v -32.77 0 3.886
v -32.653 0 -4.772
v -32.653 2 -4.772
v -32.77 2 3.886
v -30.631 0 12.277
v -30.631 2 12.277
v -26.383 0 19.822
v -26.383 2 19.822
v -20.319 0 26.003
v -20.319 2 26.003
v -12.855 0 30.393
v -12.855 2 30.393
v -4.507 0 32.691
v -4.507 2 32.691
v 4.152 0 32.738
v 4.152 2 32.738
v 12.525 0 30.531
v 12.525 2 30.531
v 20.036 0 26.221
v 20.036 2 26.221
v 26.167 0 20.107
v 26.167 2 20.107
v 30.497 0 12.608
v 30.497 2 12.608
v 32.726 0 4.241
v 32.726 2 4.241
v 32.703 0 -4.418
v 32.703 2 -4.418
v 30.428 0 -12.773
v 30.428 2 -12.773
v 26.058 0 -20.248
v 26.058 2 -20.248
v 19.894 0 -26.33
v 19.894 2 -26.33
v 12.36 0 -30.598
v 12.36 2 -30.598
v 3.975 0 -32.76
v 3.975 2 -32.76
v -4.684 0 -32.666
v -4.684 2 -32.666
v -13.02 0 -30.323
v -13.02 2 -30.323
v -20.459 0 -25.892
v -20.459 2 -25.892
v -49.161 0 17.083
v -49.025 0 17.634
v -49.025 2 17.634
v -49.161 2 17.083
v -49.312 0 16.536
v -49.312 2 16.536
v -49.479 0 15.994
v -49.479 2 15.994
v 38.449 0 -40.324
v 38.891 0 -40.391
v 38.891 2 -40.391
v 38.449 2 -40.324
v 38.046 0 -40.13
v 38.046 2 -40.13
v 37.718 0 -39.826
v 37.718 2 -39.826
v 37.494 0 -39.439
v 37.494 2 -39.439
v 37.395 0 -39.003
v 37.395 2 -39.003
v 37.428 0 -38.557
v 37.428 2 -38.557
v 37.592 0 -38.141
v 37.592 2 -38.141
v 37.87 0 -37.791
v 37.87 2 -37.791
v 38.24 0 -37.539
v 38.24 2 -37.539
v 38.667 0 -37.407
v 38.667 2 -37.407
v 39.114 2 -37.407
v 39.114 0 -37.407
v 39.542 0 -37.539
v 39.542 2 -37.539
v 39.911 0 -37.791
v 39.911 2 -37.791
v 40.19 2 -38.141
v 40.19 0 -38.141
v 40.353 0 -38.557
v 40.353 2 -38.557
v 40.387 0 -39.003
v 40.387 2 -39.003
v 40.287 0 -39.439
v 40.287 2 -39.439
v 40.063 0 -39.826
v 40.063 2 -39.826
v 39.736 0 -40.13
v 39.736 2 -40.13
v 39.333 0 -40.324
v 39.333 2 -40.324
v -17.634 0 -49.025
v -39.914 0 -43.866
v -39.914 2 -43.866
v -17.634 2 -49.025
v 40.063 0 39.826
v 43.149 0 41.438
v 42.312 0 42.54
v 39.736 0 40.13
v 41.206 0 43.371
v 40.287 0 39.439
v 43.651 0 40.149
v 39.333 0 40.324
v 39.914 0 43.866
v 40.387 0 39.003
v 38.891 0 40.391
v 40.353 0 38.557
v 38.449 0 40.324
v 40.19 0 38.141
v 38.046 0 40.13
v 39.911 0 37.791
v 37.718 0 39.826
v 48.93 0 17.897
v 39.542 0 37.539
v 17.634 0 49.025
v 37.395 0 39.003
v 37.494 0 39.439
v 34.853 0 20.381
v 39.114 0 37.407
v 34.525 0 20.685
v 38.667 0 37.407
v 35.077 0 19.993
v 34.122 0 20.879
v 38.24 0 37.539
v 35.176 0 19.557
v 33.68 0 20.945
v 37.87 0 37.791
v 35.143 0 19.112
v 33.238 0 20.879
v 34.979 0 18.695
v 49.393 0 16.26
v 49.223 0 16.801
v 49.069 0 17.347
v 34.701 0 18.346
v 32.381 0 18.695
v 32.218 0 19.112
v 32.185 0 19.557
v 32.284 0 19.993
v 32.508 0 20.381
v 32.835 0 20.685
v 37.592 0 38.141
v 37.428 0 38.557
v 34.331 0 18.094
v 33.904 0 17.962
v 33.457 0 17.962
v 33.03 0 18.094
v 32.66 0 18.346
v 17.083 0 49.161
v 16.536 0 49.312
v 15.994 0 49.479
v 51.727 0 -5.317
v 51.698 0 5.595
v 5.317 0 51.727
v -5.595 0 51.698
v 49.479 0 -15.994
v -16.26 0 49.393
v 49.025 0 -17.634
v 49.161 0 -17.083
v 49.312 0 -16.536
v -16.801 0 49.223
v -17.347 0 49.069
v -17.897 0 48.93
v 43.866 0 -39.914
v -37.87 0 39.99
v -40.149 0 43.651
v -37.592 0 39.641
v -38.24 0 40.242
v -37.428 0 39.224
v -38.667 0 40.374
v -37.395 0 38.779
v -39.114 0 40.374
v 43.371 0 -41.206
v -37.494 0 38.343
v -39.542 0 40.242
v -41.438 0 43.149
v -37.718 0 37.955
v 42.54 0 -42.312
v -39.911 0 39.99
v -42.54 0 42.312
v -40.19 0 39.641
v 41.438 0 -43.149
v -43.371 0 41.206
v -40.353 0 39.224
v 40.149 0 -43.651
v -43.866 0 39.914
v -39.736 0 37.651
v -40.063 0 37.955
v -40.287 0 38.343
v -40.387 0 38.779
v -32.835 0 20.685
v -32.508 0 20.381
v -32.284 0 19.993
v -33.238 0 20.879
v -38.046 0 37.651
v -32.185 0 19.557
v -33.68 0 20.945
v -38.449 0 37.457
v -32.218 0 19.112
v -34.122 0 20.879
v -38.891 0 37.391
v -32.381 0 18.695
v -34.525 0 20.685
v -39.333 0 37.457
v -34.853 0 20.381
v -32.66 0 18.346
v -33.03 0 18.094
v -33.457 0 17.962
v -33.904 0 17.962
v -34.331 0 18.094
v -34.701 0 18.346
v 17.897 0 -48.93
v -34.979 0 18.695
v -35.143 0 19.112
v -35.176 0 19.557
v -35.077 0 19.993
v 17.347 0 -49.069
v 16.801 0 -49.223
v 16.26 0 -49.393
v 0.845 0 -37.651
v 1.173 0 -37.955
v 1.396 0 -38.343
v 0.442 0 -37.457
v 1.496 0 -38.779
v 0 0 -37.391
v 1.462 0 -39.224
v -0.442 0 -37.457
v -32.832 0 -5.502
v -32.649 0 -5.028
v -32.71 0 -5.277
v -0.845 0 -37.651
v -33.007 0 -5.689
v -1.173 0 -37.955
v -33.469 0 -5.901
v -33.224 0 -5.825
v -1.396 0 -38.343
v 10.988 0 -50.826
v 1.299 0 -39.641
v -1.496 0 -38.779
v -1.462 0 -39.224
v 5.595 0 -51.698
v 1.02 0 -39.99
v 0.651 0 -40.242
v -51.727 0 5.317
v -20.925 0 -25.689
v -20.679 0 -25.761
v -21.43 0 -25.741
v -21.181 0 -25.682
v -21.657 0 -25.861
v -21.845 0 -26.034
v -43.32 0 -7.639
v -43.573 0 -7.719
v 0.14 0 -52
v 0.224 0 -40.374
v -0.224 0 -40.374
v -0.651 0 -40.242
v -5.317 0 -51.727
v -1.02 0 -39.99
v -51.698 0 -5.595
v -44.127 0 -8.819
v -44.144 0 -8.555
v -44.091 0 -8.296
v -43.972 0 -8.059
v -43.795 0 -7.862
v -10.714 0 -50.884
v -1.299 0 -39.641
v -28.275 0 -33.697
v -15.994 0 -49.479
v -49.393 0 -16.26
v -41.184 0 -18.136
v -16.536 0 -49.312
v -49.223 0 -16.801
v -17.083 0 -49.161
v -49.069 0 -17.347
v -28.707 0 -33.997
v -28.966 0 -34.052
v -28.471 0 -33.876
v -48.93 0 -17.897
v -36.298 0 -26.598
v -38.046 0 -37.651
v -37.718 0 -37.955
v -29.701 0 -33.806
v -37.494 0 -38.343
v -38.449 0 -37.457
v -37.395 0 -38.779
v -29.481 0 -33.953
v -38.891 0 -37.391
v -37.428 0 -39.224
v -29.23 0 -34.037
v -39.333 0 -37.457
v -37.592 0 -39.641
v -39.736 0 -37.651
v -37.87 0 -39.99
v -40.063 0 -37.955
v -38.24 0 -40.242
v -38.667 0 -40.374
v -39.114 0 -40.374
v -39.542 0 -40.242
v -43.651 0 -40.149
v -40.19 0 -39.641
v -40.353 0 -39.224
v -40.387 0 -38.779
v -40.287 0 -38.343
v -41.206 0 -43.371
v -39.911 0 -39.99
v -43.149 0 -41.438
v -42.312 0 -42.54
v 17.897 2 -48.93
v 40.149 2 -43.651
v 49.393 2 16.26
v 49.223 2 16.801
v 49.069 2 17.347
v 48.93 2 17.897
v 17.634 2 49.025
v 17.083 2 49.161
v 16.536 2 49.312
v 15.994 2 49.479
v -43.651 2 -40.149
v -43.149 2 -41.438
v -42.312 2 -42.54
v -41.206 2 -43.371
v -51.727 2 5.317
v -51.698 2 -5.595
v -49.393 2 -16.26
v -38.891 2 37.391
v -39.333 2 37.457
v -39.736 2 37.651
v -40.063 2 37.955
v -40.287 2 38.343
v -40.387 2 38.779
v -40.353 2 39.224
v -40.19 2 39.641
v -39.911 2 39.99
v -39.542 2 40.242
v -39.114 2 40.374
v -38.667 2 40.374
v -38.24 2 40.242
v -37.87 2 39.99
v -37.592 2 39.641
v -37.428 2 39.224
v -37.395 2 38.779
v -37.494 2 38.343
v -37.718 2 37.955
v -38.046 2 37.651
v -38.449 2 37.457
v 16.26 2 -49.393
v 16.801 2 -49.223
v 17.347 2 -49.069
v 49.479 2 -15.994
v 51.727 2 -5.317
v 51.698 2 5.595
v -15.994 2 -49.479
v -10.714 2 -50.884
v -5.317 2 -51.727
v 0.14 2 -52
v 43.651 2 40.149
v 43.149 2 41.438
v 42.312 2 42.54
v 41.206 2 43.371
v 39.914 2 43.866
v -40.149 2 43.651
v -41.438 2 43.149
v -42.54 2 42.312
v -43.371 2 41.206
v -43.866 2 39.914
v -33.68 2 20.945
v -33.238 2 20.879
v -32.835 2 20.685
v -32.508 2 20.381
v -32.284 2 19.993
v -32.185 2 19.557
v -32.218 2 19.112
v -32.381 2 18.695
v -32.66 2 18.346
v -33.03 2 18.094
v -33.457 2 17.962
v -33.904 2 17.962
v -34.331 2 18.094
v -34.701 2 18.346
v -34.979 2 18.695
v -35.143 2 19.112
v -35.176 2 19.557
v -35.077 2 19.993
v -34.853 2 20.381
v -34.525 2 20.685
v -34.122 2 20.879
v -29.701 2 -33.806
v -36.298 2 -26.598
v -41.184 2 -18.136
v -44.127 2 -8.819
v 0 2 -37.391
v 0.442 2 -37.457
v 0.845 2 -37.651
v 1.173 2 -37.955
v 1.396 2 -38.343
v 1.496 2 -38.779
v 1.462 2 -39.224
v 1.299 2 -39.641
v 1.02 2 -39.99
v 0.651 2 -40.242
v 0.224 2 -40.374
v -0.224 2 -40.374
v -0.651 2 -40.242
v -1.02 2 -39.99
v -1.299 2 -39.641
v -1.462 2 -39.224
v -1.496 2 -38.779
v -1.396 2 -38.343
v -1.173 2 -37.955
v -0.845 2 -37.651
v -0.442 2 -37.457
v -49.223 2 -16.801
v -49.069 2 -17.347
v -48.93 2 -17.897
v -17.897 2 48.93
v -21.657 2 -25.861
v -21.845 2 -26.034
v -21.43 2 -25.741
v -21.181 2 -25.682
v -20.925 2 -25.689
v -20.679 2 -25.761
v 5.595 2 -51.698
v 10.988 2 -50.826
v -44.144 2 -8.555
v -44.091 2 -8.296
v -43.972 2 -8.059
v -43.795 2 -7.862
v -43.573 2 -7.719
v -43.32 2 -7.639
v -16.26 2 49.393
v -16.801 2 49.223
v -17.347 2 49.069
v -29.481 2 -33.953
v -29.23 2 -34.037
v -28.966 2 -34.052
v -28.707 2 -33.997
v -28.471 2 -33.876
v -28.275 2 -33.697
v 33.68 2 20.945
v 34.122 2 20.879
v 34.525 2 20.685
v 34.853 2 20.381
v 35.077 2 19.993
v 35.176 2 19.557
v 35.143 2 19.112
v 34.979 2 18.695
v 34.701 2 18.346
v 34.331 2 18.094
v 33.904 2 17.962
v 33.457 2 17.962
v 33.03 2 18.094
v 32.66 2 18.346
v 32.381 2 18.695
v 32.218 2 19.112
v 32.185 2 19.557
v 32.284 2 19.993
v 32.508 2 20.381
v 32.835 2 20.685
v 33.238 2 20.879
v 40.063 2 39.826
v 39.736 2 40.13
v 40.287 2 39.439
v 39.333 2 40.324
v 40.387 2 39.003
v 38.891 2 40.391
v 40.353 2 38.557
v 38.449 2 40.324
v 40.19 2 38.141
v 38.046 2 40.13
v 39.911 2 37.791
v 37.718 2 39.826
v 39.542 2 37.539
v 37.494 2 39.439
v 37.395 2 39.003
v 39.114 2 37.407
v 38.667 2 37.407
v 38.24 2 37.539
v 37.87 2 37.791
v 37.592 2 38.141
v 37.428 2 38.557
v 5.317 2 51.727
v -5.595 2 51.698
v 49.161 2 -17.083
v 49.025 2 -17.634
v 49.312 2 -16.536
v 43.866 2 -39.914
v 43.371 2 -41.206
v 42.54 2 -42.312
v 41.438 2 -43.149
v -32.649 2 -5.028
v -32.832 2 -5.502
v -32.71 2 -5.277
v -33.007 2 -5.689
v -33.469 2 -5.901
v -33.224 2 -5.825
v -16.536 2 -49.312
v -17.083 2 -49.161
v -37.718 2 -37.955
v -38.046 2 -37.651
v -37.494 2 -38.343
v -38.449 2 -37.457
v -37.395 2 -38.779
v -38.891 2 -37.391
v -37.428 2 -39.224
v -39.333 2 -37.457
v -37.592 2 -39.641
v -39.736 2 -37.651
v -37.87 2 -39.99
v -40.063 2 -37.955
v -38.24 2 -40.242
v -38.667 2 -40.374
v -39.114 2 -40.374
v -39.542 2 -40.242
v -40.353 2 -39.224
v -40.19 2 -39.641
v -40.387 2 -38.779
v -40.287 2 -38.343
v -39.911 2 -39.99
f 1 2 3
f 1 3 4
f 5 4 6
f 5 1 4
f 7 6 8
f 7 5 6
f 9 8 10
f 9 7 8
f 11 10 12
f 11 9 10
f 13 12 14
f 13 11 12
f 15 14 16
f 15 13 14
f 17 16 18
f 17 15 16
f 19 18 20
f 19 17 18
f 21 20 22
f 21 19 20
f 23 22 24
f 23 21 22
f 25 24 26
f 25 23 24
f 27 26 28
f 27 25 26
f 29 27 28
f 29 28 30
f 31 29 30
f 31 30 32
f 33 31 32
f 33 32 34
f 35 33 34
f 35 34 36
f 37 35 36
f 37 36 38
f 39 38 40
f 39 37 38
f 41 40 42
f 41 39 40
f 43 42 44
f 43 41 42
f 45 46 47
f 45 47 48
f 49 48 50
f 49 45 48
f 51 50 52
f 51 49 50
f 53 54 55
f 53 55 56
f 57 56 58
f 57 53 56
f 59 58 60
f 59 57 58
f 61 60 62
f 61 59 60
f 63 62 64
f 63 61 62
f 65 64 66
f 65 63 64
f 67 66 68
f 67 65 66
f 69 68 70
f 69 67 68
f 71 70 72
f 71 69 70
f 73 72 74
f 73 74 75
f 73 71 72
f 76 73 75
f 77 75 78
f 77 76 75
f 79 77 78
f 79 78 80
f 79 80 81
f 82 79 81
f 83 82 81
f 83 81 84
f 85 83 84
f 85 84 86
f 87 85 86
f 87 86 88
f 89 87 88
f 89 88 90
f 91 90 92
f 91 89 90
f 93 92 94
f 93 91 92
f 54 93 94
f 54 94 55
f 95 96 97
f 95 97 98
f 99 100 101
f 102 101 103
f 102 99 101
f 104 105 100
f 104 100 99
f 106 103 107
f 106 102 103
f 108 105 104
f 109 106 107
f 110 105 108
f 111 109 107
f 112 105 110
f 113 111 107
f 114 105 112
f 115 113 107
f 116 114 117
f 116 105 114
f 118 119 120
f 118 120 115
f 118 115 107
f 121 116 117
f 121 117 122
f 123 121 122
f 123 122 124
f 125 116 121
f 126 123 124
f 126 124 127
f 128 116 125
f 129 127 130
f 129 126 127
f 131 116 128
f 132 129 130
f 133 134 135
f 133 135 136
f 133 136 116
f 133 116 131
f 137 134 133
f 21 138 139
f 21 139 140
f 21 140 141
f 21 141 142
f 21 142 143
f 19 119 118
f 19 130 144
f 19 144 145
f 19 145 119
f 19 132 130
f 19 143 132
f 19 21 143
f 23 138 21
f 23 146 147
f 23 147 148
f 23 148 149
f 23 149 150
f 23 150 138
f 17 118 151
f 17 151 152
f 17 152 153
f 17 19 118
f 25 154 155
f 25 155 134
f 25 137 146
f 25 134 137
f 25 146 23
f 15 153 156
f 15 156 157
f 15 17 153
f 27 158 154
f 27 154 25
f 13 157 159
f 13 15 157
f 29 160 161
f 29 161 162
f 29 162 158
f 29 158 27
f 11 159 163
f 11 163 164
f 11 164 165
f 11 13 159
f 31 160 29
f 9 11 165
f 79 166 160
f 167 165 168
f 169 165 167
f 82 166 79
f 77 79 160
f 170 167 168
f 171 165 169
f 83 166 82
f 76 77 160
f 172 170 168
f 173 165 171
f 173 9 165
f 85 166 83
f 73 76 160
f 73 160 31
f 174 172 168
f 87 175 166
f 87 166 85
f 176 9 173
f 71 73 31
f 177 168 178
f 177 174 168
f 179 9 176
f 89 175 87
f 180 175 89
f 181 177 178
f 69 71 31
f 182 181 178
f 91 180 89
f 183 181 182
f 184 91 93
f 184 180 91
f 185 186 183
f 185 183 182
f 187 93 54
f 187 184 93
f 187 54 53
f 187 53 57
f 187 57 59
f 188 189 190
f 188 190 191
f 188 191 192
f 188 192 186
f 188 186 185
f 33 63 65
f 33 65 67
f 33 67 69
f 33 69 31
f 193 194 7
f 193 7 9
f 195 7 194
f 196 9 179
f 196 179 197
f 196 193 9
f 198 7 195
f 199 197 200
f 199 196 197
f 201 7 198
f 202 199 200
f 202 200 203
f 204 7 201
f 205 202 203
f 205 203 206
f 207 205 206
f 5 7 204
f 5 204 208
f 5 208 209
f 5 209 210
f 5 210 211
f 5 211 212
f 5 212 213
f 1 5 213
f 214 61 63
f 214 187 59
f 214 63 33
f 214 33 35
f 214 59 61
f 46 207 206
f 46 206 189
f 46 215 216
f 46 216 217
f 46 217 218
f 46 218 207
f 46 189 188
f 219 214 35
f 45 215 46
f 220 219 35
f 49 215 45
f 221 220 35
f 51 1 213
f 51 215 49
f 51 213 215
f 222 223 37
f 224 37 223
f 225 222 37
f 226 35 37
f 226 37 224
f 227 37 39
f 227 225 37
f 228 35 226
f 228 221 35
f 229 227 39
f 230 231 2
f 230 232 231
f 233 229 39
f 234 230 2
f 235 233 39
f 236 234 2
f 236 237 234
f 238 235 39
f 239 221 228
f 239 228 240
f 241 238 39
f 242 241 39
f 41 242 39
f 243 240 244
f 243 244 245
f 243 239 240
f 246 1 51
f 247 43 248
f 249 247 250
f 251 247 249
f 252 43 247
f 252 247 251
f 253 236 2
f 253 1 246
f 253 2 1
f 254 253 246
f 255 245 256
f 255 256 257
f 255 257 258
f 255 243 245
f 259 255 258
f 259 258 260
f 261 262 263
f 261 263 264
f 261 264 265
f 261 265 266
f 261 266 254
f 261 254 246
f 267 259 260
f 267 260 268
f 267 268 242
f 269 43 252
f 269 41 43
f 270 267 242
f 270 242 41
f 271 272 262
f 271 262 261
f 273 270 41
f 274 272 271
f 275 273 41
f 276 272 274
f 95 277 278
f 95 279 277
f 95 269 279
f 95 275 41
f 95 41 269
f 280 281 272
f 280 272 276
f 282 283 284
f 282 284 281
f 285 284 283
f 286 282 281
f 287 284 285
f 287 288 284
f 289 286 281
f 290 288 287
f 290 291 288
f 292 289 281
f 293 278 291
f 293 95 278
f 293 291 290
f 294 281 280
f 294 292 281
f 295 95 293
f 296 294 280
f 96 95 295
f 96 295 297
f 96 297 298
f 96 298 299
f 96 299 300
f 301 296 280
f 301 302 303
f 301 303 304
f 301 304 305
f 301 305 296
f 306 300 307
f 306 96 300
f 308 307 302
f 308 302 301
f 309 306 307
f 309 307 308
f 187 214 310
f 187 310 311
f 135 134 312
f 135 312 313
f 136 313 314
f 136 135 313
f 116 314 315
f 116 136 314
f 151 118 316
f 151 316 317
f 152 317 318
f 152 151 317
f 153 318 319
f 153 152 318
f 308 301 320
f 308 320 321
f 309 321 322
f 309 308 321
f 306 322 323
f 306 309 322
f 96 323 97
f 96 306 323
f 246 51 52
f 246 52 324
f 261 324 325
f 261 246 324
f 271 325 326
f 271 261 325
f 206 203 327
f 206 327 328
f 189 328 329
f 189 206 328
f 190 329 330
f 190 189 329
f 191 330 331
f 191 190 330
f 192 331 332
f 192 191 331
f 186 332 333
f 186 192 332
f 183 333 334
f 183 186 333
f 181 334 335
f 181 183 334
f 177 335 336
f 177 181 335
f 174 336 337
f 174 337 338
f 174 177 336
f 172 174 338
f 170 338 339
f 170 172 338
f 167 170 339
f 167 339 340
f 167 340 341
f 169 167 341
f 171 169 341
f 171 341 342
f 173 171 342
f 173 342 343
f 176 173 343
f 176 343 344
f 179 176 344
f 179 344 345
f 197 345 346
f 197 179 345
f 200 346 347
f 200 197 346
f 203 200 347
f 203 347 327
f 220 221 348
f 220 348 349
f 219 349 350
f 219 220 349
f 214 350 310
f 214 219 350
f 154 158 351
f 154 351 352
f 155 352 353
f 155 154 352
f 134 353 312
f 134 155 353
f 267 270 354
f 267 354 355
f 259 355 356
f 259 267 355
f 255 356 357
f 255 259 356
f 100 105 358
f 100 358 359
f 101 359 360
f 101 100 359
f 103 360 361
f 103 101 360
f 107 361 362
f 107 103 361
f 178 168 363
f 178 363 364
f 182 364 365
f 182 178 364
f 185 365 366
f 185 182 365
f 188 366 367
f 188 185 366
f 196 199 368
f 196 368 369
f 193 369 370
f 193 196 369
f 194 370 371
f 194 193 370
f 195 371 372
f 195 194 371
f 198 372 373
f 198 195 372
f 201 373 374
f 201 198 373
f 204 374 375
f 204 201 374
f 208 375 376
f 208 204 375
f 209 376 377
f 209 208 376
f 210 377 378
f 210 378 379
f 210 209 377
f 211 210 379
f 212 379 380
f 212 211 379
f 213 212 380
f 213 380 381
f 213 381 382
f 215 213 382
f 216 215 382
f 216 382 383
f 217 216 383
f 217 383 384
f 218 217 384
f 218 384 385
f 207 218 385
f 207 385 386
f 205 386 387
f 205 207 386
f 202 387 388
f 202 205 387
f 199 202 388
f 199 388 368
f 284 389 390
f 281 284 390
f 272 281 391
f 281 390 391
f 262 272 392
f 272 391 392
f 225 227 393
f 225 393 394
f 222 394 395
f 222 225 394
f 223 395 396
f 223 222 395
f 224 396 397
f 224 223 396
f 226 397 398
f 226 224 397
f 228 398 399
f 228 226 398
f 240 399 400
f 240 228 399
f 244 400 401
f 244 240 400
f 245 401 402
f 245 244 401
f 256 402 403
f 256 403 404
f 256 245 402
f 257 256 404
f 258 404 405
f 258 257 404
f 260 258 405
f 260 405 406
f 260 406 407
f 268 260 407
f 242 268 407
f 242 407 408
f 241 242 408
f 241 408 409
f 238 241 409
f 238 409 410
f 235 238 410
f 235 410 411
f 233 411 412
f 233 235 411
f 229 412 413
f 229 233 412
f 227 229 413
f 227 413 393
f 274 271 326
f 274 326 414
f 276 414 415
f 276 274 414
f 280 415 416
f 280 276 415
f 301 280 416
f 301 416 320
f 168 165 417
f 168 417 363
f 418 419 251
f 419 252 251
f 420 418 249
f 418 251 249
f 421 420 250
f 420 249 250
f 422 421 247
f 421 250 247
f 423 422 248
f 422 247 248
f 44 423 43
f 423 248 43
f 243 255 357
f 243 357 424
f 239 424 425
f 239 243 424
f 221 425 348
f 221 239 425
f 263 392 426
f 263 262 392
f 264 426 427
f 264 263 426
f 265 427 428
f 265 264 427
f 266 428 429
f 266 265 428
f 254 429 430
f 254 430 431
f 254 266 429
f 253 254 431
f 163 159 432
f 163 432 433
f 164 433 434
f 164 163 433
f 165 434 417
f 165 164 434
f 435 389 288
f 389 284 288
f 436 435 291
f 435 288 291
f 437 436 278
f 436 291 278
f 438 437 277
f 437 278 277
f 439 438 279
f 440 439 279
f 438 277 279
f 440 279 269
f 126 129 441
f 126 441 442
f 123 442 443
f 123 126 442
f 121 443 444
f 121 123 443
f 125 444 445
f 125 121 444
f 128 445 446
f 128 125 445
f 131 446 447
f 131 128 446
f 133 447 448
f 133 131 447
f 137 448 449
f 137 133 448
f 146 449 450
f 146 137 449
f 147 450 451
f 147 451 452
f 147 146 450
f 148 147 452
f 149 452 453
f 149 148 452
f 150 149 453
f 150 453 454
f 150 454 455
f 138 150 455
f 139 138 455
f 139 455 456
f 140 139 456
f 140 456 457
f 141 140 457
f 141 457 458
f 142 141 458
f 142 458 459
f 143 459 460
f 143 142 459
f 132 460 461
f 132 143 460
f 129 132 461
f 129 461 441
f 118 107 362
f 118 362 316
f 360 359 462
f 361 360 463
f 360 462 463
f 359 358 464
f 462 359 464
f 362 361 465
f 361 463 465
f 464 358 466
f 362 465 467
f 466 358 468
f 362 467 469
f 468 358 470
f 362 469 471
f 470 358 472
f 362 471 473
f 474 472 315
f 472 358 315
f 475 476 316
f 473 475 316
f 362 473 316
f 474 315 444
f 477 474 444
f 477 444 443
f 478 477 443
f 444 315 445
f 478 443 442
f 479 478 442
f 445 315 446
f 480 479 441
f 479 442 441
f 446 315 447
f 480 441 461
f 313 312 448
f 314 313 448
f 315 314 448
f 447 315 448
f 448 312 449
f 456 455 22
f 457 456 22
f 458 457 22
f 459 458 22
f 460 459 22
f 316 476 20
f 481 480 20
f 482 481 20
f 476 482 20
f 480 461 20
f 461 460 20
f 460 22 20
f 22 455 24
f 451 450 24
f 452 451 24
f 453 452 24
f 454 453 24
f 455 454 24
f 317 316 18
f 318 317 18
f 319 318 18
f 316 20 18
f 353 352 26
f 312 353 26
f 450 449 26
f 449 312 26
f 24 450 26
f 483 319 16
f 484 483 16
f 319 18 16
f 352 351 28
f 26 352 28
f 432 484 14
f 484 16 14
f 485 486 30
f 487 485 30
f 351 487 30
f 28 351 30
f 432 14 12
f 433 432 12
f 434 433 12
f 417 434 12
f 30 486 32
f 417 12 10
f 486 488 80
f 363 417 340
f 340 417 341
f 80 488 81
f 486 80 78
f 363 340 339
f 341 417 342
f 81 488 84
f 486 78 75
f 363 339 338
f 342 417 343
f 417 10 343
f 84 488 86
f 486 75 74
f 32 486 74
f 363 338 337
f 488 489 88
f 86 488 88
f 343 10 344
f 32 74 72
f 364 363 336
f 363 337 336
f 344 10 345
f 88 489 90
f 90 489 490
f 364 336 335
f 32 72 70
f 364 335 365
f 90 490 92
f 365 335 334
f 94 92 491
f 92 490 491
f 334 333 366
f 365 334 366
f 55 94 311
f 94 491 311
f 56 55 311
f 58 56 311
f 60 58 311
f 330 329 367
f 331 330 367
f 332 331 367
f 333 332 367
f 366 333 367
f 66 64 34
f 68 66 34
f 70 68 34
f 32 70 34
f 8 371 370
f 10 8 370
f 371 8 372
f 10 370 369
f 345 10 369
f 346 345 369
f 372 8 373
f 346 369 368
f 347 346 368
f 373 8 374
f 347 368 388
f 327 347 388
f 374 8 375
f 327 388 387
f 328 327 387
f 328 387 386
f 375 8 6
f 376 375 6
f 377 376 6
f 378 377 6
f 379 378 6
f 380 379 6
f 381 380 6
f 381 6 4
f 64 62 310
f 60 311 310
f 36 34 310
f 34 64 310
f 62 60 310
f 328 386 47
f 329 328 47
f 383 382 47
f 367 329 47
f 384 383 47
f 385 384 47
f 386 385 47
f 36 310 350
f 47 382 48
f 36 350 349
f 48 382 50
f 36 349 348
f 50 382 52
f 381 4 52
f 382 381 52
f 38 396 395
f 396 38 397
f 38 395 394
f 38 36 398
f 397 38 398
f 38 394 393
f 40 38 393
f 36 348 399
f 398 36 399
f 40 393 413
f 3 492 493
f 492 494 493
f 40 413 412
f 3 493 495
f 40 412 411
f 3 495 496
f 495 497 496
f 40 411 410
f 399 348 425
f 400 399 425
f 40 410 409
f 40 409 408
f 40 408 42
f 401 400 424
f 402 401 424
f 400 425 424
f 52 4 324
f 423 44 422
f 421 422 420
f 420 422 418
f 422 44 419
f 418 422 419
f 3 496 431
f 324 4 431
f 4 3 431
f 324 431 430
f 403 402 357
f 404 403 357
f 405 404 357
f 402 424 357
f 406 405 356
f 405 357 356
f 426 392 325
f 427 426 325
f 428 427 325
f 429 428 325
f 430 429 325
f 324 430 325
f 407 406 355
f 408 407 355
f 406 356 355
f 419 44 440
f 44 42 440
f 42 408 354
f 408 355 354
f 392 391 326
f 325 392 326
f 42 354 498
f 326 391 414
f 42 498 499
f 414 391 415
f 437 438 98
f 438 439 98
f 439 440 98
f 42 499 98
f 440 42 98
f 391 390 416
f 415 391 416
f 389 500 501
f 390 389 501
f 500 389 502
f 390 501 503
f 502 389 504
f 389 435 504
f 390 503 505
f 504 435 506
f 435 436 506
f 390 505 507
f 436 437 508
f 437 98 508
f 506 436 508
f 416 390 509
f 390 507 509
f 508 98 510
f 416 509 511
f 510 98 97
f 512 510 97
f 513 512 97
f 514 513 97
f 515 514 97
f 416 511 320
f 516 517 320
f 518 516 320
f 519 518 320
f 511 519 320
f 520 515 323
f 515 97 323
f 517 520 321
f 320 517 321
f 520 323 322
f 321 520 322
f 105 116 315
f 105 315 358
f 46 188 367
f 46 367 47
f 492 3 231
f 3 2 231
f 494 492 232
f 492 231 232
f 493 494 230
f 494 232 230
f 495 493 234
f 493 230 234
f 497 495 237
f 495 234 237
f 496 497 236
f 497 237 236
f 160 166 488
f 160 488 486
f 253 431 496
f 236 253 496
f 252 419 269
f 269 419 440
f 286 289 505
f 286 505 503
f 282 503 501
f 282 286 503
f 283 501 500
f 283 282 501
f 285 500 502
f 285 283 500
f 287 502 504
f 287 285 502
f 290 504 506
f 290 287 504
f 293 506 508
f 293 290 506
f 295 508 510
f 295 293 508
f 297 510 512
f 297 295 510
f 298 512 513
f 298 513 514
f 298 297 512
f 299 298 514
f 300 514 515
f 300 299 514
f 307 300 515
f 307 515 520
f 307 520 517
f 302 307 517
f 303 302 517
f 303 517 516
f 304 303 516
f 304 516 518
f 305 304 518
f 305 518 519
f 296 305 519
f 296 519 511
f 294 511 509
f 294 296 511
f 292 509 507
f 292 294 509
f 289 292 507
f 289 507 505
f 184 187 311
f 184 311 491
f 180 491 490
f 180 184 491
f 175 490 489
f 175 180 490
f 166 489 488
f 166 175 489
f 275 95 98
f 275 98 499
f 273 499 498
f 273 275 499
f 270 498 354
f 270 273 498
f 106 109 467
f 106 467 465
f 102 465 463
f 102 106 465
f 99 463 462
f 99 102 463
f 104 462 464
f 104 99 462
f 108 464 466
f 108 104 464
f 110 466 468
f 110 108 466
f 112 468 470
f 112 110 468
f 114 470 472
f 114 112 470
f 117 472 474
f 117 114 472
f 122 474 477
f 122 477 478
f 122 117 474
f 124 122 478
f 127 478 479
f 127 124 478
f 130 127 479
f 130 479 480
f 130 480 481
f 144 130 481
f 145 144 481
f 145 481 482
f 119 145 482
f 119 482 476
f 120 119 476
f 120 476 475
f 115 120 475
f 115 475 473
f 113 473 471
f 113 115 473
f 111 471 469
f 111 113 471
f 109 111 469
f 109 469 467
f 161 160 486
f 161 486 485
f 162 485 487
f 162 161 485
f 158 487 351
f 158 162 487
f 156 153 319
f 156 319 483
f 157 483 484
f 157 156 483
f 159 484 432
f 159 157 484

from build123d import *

# Parameters (mm, degrees)
SKETCH2_R           = 1.5
SKETCH2_R_2         = 33
BOSS_EXTRUDE1_DEPTH = 2
CUT_EXTRUDE1_DEPTH  = 74.566296631
FILLET1_R           = 1


with BuildPart() as part:
    # Sketch2 → Boss-Extrude1 (new body)
    with BuildSketch(Plane(origin=(0, 0, 0), x_dir=(1, 0, 0), z_dir=(0, 1, 0))):
        with BuildLine():
            Line((17.897079586, 48.929734976), (40.149284407, 43.651218265))
            ThreePointArc((40.149284407, 43.651218265), (42.540265174, 42.312242187), (43.866371506, 39.91409958))
            Line((43.866371506, 39.91409958), (49.02521675, 17.633846579))
            ThreePointArc((49.02521675, 17.633846579), (49.23478351, 16.809026698), (49.479249782, 15.993868858))
            ThreePointArc((49.479249782, 15.993868858), (51.999812242, -0.139738387), (49.392575566, -16.259565766))
            ThreePointArc((49.392575566, -16.259565766), (49.143731732, -17.073397941), (48.929734976, -17.897079586))
            Line((48.929734976, -17.897079586), (43.651218265, -40.149284407))
            ThreePointArc((43.651218265, -40.149284407), (42.312242187, -42.540265174), (39.91409958, -43.866371506))
            Line((39.91409958, -43.866371506), (17.633846579, -49.02521675))
            ThreePointArc((17.633846579, -49.02521675), (16.809026698, -49.23478351), (15.993868858, -49.479249782))
            ThreePointArc((15.993868858, -49.479249782), (-0.139738387, -51.999812242), (-16.259565766, -49.392575566))
            ThreePointArc((-16.259565766, -49.392575566), (-17.073397941, -49.143731732), (-17.897079586, -48.929734976))
            Line((-17.897079586, -48.929734976), (-40.149284407, -43.651218265))
            ThreePointArc((-40.149284407, -43.651218265), (-42.540265174, -42.312242187), (-43.866371506, -39.91409958))
            Line((-43.866371506, -39.91409958), (-49.02521675, -17.633846579))
            ThreePointArc((-49.02521675, -17.633846579), (-49.23478351, -16.809026698), (-49.479249782, -15.993868858))
            ThreePointArc((-49.479249782, -15.993868858), (-51.999812242, 0.139738387), (-49.392575566, 16.259565766))
            ThreePointArc((-49.392575566, 16.259565766), (-49.143731732, 17.073397941), (-48.929734976, 17.897079586))
            Line((-48.929734976, 17.897079586), (-43.651218265, 40.149284407))
            ThreePointArc((-43.651218265, 40.149284407), (-42.312242187, 42.540265174), (-39.91409958, 43.866371506))
            Line((-39.91409958, 43.866371506), (-17.633846579, 49.02521675))
            ThreePointArc((-17.633846579, 49.02521675), (-16.809026698, 49.23478351), (-15.993868858, 49.479249782))
            ThreePointArc((-15.993868858, 49.479249782), (-8.026622704, 51.3767781), (0.139738387, 51.999812242))
            ThreePointArc((0.139738387, 51.999812242), (8.302633013, 51.332896714), (16.259565766, 49.392575566))
            ThreePointArc((16.259565766, 49.392575566), (17.073397941, 49.143731732), (17.897079586, 48.929734976))
        make_face()
        with Locations(Location((-38.8907, 38.8907, 0), (0, 0, 270))):
            Circle(SKETCH2_R, mode=Mode.SUBTRACT)
        with Locations(Location((38.8907, 38.8907, 0), (0, 0, 90))):
            Circle(SKETCH2_R, mode=Mode.SUBTRACT)
        with Locations(Location((38.8907, -38.8907, 0), (0, 0, 270))):
            Circle(SKETCH2_R, mode=Mode.SUBTRACT)
        with Locations(Location((-38.8907, -38.8907, 0), (0, 0, 90))):
            Circle(SKETCH2_R, mode=Mode.SUBTRACT)
        with Locations(Location((0, 0, 0), (0, 0, 270))):
            Circle(SKETCH2_R_2, mode=Mode.SUBTRACT)
        with Locations(Location((0, 38.8907, 0), (0, 0, 270))):
            Circle(SKETCH2_R, mode=Mode.SUBTRACT)
        with Locations(Location((-33.680334171, -19.44535, 0), (0, 0, 270))):
            Circle(SKETCH2_R, mode=Mode.SUBTRACT)
        with Locations(Location((33.680334171, -19.44535, 0), (0, 0, 270))):
            Circle(SKETCH2_R, mode=Mode.SUBTRACT)
    extrude(amount=BOSS_EXTRUDE1_DEPTH)

    # Sketch3 → Cut-Extrude1 (cut, through all)
    with BuildSketch(Plane(origin=(0, 2, 0), x_dir=(1, 0, 0), z_dir=(0, 1, 0))):
        with BuildLine():
            Line((-21.21199112, 25.279466623), (-28.925442436, 34.47199994))
            ThreePointArc((-28.925442436, 34.47199994), (-38.97114317, 22.5), (-44.316348886, 7.814167995))
            Line((-44.316348886, 7.814167995), (-32.498655849, 5.730389863))
            ThreePointArc((-32.498655849, 5.730389863), (-28.578838325, 16.5), (-21.21199112, 25.279466623))
        make_face()
    extrude(amount=-CUT_EXTRUDE1_DEPTH, mode=Mode.SUBTRACT)

    # Fillet1
    fillet1_edges = [part.edges().sort_by_distance(p)[0] for p in [
        (-44.316348886, 1, -7.814167995),
        (-28.925442436, 1, -34.47199994),
        (-21.21199112, 1, -25.279466623),
        (-32.498655849, 1, -5.730389863),
    ]]
    fillet(fillet1_edges, radius=FILLET1_R)


solid = part.part
